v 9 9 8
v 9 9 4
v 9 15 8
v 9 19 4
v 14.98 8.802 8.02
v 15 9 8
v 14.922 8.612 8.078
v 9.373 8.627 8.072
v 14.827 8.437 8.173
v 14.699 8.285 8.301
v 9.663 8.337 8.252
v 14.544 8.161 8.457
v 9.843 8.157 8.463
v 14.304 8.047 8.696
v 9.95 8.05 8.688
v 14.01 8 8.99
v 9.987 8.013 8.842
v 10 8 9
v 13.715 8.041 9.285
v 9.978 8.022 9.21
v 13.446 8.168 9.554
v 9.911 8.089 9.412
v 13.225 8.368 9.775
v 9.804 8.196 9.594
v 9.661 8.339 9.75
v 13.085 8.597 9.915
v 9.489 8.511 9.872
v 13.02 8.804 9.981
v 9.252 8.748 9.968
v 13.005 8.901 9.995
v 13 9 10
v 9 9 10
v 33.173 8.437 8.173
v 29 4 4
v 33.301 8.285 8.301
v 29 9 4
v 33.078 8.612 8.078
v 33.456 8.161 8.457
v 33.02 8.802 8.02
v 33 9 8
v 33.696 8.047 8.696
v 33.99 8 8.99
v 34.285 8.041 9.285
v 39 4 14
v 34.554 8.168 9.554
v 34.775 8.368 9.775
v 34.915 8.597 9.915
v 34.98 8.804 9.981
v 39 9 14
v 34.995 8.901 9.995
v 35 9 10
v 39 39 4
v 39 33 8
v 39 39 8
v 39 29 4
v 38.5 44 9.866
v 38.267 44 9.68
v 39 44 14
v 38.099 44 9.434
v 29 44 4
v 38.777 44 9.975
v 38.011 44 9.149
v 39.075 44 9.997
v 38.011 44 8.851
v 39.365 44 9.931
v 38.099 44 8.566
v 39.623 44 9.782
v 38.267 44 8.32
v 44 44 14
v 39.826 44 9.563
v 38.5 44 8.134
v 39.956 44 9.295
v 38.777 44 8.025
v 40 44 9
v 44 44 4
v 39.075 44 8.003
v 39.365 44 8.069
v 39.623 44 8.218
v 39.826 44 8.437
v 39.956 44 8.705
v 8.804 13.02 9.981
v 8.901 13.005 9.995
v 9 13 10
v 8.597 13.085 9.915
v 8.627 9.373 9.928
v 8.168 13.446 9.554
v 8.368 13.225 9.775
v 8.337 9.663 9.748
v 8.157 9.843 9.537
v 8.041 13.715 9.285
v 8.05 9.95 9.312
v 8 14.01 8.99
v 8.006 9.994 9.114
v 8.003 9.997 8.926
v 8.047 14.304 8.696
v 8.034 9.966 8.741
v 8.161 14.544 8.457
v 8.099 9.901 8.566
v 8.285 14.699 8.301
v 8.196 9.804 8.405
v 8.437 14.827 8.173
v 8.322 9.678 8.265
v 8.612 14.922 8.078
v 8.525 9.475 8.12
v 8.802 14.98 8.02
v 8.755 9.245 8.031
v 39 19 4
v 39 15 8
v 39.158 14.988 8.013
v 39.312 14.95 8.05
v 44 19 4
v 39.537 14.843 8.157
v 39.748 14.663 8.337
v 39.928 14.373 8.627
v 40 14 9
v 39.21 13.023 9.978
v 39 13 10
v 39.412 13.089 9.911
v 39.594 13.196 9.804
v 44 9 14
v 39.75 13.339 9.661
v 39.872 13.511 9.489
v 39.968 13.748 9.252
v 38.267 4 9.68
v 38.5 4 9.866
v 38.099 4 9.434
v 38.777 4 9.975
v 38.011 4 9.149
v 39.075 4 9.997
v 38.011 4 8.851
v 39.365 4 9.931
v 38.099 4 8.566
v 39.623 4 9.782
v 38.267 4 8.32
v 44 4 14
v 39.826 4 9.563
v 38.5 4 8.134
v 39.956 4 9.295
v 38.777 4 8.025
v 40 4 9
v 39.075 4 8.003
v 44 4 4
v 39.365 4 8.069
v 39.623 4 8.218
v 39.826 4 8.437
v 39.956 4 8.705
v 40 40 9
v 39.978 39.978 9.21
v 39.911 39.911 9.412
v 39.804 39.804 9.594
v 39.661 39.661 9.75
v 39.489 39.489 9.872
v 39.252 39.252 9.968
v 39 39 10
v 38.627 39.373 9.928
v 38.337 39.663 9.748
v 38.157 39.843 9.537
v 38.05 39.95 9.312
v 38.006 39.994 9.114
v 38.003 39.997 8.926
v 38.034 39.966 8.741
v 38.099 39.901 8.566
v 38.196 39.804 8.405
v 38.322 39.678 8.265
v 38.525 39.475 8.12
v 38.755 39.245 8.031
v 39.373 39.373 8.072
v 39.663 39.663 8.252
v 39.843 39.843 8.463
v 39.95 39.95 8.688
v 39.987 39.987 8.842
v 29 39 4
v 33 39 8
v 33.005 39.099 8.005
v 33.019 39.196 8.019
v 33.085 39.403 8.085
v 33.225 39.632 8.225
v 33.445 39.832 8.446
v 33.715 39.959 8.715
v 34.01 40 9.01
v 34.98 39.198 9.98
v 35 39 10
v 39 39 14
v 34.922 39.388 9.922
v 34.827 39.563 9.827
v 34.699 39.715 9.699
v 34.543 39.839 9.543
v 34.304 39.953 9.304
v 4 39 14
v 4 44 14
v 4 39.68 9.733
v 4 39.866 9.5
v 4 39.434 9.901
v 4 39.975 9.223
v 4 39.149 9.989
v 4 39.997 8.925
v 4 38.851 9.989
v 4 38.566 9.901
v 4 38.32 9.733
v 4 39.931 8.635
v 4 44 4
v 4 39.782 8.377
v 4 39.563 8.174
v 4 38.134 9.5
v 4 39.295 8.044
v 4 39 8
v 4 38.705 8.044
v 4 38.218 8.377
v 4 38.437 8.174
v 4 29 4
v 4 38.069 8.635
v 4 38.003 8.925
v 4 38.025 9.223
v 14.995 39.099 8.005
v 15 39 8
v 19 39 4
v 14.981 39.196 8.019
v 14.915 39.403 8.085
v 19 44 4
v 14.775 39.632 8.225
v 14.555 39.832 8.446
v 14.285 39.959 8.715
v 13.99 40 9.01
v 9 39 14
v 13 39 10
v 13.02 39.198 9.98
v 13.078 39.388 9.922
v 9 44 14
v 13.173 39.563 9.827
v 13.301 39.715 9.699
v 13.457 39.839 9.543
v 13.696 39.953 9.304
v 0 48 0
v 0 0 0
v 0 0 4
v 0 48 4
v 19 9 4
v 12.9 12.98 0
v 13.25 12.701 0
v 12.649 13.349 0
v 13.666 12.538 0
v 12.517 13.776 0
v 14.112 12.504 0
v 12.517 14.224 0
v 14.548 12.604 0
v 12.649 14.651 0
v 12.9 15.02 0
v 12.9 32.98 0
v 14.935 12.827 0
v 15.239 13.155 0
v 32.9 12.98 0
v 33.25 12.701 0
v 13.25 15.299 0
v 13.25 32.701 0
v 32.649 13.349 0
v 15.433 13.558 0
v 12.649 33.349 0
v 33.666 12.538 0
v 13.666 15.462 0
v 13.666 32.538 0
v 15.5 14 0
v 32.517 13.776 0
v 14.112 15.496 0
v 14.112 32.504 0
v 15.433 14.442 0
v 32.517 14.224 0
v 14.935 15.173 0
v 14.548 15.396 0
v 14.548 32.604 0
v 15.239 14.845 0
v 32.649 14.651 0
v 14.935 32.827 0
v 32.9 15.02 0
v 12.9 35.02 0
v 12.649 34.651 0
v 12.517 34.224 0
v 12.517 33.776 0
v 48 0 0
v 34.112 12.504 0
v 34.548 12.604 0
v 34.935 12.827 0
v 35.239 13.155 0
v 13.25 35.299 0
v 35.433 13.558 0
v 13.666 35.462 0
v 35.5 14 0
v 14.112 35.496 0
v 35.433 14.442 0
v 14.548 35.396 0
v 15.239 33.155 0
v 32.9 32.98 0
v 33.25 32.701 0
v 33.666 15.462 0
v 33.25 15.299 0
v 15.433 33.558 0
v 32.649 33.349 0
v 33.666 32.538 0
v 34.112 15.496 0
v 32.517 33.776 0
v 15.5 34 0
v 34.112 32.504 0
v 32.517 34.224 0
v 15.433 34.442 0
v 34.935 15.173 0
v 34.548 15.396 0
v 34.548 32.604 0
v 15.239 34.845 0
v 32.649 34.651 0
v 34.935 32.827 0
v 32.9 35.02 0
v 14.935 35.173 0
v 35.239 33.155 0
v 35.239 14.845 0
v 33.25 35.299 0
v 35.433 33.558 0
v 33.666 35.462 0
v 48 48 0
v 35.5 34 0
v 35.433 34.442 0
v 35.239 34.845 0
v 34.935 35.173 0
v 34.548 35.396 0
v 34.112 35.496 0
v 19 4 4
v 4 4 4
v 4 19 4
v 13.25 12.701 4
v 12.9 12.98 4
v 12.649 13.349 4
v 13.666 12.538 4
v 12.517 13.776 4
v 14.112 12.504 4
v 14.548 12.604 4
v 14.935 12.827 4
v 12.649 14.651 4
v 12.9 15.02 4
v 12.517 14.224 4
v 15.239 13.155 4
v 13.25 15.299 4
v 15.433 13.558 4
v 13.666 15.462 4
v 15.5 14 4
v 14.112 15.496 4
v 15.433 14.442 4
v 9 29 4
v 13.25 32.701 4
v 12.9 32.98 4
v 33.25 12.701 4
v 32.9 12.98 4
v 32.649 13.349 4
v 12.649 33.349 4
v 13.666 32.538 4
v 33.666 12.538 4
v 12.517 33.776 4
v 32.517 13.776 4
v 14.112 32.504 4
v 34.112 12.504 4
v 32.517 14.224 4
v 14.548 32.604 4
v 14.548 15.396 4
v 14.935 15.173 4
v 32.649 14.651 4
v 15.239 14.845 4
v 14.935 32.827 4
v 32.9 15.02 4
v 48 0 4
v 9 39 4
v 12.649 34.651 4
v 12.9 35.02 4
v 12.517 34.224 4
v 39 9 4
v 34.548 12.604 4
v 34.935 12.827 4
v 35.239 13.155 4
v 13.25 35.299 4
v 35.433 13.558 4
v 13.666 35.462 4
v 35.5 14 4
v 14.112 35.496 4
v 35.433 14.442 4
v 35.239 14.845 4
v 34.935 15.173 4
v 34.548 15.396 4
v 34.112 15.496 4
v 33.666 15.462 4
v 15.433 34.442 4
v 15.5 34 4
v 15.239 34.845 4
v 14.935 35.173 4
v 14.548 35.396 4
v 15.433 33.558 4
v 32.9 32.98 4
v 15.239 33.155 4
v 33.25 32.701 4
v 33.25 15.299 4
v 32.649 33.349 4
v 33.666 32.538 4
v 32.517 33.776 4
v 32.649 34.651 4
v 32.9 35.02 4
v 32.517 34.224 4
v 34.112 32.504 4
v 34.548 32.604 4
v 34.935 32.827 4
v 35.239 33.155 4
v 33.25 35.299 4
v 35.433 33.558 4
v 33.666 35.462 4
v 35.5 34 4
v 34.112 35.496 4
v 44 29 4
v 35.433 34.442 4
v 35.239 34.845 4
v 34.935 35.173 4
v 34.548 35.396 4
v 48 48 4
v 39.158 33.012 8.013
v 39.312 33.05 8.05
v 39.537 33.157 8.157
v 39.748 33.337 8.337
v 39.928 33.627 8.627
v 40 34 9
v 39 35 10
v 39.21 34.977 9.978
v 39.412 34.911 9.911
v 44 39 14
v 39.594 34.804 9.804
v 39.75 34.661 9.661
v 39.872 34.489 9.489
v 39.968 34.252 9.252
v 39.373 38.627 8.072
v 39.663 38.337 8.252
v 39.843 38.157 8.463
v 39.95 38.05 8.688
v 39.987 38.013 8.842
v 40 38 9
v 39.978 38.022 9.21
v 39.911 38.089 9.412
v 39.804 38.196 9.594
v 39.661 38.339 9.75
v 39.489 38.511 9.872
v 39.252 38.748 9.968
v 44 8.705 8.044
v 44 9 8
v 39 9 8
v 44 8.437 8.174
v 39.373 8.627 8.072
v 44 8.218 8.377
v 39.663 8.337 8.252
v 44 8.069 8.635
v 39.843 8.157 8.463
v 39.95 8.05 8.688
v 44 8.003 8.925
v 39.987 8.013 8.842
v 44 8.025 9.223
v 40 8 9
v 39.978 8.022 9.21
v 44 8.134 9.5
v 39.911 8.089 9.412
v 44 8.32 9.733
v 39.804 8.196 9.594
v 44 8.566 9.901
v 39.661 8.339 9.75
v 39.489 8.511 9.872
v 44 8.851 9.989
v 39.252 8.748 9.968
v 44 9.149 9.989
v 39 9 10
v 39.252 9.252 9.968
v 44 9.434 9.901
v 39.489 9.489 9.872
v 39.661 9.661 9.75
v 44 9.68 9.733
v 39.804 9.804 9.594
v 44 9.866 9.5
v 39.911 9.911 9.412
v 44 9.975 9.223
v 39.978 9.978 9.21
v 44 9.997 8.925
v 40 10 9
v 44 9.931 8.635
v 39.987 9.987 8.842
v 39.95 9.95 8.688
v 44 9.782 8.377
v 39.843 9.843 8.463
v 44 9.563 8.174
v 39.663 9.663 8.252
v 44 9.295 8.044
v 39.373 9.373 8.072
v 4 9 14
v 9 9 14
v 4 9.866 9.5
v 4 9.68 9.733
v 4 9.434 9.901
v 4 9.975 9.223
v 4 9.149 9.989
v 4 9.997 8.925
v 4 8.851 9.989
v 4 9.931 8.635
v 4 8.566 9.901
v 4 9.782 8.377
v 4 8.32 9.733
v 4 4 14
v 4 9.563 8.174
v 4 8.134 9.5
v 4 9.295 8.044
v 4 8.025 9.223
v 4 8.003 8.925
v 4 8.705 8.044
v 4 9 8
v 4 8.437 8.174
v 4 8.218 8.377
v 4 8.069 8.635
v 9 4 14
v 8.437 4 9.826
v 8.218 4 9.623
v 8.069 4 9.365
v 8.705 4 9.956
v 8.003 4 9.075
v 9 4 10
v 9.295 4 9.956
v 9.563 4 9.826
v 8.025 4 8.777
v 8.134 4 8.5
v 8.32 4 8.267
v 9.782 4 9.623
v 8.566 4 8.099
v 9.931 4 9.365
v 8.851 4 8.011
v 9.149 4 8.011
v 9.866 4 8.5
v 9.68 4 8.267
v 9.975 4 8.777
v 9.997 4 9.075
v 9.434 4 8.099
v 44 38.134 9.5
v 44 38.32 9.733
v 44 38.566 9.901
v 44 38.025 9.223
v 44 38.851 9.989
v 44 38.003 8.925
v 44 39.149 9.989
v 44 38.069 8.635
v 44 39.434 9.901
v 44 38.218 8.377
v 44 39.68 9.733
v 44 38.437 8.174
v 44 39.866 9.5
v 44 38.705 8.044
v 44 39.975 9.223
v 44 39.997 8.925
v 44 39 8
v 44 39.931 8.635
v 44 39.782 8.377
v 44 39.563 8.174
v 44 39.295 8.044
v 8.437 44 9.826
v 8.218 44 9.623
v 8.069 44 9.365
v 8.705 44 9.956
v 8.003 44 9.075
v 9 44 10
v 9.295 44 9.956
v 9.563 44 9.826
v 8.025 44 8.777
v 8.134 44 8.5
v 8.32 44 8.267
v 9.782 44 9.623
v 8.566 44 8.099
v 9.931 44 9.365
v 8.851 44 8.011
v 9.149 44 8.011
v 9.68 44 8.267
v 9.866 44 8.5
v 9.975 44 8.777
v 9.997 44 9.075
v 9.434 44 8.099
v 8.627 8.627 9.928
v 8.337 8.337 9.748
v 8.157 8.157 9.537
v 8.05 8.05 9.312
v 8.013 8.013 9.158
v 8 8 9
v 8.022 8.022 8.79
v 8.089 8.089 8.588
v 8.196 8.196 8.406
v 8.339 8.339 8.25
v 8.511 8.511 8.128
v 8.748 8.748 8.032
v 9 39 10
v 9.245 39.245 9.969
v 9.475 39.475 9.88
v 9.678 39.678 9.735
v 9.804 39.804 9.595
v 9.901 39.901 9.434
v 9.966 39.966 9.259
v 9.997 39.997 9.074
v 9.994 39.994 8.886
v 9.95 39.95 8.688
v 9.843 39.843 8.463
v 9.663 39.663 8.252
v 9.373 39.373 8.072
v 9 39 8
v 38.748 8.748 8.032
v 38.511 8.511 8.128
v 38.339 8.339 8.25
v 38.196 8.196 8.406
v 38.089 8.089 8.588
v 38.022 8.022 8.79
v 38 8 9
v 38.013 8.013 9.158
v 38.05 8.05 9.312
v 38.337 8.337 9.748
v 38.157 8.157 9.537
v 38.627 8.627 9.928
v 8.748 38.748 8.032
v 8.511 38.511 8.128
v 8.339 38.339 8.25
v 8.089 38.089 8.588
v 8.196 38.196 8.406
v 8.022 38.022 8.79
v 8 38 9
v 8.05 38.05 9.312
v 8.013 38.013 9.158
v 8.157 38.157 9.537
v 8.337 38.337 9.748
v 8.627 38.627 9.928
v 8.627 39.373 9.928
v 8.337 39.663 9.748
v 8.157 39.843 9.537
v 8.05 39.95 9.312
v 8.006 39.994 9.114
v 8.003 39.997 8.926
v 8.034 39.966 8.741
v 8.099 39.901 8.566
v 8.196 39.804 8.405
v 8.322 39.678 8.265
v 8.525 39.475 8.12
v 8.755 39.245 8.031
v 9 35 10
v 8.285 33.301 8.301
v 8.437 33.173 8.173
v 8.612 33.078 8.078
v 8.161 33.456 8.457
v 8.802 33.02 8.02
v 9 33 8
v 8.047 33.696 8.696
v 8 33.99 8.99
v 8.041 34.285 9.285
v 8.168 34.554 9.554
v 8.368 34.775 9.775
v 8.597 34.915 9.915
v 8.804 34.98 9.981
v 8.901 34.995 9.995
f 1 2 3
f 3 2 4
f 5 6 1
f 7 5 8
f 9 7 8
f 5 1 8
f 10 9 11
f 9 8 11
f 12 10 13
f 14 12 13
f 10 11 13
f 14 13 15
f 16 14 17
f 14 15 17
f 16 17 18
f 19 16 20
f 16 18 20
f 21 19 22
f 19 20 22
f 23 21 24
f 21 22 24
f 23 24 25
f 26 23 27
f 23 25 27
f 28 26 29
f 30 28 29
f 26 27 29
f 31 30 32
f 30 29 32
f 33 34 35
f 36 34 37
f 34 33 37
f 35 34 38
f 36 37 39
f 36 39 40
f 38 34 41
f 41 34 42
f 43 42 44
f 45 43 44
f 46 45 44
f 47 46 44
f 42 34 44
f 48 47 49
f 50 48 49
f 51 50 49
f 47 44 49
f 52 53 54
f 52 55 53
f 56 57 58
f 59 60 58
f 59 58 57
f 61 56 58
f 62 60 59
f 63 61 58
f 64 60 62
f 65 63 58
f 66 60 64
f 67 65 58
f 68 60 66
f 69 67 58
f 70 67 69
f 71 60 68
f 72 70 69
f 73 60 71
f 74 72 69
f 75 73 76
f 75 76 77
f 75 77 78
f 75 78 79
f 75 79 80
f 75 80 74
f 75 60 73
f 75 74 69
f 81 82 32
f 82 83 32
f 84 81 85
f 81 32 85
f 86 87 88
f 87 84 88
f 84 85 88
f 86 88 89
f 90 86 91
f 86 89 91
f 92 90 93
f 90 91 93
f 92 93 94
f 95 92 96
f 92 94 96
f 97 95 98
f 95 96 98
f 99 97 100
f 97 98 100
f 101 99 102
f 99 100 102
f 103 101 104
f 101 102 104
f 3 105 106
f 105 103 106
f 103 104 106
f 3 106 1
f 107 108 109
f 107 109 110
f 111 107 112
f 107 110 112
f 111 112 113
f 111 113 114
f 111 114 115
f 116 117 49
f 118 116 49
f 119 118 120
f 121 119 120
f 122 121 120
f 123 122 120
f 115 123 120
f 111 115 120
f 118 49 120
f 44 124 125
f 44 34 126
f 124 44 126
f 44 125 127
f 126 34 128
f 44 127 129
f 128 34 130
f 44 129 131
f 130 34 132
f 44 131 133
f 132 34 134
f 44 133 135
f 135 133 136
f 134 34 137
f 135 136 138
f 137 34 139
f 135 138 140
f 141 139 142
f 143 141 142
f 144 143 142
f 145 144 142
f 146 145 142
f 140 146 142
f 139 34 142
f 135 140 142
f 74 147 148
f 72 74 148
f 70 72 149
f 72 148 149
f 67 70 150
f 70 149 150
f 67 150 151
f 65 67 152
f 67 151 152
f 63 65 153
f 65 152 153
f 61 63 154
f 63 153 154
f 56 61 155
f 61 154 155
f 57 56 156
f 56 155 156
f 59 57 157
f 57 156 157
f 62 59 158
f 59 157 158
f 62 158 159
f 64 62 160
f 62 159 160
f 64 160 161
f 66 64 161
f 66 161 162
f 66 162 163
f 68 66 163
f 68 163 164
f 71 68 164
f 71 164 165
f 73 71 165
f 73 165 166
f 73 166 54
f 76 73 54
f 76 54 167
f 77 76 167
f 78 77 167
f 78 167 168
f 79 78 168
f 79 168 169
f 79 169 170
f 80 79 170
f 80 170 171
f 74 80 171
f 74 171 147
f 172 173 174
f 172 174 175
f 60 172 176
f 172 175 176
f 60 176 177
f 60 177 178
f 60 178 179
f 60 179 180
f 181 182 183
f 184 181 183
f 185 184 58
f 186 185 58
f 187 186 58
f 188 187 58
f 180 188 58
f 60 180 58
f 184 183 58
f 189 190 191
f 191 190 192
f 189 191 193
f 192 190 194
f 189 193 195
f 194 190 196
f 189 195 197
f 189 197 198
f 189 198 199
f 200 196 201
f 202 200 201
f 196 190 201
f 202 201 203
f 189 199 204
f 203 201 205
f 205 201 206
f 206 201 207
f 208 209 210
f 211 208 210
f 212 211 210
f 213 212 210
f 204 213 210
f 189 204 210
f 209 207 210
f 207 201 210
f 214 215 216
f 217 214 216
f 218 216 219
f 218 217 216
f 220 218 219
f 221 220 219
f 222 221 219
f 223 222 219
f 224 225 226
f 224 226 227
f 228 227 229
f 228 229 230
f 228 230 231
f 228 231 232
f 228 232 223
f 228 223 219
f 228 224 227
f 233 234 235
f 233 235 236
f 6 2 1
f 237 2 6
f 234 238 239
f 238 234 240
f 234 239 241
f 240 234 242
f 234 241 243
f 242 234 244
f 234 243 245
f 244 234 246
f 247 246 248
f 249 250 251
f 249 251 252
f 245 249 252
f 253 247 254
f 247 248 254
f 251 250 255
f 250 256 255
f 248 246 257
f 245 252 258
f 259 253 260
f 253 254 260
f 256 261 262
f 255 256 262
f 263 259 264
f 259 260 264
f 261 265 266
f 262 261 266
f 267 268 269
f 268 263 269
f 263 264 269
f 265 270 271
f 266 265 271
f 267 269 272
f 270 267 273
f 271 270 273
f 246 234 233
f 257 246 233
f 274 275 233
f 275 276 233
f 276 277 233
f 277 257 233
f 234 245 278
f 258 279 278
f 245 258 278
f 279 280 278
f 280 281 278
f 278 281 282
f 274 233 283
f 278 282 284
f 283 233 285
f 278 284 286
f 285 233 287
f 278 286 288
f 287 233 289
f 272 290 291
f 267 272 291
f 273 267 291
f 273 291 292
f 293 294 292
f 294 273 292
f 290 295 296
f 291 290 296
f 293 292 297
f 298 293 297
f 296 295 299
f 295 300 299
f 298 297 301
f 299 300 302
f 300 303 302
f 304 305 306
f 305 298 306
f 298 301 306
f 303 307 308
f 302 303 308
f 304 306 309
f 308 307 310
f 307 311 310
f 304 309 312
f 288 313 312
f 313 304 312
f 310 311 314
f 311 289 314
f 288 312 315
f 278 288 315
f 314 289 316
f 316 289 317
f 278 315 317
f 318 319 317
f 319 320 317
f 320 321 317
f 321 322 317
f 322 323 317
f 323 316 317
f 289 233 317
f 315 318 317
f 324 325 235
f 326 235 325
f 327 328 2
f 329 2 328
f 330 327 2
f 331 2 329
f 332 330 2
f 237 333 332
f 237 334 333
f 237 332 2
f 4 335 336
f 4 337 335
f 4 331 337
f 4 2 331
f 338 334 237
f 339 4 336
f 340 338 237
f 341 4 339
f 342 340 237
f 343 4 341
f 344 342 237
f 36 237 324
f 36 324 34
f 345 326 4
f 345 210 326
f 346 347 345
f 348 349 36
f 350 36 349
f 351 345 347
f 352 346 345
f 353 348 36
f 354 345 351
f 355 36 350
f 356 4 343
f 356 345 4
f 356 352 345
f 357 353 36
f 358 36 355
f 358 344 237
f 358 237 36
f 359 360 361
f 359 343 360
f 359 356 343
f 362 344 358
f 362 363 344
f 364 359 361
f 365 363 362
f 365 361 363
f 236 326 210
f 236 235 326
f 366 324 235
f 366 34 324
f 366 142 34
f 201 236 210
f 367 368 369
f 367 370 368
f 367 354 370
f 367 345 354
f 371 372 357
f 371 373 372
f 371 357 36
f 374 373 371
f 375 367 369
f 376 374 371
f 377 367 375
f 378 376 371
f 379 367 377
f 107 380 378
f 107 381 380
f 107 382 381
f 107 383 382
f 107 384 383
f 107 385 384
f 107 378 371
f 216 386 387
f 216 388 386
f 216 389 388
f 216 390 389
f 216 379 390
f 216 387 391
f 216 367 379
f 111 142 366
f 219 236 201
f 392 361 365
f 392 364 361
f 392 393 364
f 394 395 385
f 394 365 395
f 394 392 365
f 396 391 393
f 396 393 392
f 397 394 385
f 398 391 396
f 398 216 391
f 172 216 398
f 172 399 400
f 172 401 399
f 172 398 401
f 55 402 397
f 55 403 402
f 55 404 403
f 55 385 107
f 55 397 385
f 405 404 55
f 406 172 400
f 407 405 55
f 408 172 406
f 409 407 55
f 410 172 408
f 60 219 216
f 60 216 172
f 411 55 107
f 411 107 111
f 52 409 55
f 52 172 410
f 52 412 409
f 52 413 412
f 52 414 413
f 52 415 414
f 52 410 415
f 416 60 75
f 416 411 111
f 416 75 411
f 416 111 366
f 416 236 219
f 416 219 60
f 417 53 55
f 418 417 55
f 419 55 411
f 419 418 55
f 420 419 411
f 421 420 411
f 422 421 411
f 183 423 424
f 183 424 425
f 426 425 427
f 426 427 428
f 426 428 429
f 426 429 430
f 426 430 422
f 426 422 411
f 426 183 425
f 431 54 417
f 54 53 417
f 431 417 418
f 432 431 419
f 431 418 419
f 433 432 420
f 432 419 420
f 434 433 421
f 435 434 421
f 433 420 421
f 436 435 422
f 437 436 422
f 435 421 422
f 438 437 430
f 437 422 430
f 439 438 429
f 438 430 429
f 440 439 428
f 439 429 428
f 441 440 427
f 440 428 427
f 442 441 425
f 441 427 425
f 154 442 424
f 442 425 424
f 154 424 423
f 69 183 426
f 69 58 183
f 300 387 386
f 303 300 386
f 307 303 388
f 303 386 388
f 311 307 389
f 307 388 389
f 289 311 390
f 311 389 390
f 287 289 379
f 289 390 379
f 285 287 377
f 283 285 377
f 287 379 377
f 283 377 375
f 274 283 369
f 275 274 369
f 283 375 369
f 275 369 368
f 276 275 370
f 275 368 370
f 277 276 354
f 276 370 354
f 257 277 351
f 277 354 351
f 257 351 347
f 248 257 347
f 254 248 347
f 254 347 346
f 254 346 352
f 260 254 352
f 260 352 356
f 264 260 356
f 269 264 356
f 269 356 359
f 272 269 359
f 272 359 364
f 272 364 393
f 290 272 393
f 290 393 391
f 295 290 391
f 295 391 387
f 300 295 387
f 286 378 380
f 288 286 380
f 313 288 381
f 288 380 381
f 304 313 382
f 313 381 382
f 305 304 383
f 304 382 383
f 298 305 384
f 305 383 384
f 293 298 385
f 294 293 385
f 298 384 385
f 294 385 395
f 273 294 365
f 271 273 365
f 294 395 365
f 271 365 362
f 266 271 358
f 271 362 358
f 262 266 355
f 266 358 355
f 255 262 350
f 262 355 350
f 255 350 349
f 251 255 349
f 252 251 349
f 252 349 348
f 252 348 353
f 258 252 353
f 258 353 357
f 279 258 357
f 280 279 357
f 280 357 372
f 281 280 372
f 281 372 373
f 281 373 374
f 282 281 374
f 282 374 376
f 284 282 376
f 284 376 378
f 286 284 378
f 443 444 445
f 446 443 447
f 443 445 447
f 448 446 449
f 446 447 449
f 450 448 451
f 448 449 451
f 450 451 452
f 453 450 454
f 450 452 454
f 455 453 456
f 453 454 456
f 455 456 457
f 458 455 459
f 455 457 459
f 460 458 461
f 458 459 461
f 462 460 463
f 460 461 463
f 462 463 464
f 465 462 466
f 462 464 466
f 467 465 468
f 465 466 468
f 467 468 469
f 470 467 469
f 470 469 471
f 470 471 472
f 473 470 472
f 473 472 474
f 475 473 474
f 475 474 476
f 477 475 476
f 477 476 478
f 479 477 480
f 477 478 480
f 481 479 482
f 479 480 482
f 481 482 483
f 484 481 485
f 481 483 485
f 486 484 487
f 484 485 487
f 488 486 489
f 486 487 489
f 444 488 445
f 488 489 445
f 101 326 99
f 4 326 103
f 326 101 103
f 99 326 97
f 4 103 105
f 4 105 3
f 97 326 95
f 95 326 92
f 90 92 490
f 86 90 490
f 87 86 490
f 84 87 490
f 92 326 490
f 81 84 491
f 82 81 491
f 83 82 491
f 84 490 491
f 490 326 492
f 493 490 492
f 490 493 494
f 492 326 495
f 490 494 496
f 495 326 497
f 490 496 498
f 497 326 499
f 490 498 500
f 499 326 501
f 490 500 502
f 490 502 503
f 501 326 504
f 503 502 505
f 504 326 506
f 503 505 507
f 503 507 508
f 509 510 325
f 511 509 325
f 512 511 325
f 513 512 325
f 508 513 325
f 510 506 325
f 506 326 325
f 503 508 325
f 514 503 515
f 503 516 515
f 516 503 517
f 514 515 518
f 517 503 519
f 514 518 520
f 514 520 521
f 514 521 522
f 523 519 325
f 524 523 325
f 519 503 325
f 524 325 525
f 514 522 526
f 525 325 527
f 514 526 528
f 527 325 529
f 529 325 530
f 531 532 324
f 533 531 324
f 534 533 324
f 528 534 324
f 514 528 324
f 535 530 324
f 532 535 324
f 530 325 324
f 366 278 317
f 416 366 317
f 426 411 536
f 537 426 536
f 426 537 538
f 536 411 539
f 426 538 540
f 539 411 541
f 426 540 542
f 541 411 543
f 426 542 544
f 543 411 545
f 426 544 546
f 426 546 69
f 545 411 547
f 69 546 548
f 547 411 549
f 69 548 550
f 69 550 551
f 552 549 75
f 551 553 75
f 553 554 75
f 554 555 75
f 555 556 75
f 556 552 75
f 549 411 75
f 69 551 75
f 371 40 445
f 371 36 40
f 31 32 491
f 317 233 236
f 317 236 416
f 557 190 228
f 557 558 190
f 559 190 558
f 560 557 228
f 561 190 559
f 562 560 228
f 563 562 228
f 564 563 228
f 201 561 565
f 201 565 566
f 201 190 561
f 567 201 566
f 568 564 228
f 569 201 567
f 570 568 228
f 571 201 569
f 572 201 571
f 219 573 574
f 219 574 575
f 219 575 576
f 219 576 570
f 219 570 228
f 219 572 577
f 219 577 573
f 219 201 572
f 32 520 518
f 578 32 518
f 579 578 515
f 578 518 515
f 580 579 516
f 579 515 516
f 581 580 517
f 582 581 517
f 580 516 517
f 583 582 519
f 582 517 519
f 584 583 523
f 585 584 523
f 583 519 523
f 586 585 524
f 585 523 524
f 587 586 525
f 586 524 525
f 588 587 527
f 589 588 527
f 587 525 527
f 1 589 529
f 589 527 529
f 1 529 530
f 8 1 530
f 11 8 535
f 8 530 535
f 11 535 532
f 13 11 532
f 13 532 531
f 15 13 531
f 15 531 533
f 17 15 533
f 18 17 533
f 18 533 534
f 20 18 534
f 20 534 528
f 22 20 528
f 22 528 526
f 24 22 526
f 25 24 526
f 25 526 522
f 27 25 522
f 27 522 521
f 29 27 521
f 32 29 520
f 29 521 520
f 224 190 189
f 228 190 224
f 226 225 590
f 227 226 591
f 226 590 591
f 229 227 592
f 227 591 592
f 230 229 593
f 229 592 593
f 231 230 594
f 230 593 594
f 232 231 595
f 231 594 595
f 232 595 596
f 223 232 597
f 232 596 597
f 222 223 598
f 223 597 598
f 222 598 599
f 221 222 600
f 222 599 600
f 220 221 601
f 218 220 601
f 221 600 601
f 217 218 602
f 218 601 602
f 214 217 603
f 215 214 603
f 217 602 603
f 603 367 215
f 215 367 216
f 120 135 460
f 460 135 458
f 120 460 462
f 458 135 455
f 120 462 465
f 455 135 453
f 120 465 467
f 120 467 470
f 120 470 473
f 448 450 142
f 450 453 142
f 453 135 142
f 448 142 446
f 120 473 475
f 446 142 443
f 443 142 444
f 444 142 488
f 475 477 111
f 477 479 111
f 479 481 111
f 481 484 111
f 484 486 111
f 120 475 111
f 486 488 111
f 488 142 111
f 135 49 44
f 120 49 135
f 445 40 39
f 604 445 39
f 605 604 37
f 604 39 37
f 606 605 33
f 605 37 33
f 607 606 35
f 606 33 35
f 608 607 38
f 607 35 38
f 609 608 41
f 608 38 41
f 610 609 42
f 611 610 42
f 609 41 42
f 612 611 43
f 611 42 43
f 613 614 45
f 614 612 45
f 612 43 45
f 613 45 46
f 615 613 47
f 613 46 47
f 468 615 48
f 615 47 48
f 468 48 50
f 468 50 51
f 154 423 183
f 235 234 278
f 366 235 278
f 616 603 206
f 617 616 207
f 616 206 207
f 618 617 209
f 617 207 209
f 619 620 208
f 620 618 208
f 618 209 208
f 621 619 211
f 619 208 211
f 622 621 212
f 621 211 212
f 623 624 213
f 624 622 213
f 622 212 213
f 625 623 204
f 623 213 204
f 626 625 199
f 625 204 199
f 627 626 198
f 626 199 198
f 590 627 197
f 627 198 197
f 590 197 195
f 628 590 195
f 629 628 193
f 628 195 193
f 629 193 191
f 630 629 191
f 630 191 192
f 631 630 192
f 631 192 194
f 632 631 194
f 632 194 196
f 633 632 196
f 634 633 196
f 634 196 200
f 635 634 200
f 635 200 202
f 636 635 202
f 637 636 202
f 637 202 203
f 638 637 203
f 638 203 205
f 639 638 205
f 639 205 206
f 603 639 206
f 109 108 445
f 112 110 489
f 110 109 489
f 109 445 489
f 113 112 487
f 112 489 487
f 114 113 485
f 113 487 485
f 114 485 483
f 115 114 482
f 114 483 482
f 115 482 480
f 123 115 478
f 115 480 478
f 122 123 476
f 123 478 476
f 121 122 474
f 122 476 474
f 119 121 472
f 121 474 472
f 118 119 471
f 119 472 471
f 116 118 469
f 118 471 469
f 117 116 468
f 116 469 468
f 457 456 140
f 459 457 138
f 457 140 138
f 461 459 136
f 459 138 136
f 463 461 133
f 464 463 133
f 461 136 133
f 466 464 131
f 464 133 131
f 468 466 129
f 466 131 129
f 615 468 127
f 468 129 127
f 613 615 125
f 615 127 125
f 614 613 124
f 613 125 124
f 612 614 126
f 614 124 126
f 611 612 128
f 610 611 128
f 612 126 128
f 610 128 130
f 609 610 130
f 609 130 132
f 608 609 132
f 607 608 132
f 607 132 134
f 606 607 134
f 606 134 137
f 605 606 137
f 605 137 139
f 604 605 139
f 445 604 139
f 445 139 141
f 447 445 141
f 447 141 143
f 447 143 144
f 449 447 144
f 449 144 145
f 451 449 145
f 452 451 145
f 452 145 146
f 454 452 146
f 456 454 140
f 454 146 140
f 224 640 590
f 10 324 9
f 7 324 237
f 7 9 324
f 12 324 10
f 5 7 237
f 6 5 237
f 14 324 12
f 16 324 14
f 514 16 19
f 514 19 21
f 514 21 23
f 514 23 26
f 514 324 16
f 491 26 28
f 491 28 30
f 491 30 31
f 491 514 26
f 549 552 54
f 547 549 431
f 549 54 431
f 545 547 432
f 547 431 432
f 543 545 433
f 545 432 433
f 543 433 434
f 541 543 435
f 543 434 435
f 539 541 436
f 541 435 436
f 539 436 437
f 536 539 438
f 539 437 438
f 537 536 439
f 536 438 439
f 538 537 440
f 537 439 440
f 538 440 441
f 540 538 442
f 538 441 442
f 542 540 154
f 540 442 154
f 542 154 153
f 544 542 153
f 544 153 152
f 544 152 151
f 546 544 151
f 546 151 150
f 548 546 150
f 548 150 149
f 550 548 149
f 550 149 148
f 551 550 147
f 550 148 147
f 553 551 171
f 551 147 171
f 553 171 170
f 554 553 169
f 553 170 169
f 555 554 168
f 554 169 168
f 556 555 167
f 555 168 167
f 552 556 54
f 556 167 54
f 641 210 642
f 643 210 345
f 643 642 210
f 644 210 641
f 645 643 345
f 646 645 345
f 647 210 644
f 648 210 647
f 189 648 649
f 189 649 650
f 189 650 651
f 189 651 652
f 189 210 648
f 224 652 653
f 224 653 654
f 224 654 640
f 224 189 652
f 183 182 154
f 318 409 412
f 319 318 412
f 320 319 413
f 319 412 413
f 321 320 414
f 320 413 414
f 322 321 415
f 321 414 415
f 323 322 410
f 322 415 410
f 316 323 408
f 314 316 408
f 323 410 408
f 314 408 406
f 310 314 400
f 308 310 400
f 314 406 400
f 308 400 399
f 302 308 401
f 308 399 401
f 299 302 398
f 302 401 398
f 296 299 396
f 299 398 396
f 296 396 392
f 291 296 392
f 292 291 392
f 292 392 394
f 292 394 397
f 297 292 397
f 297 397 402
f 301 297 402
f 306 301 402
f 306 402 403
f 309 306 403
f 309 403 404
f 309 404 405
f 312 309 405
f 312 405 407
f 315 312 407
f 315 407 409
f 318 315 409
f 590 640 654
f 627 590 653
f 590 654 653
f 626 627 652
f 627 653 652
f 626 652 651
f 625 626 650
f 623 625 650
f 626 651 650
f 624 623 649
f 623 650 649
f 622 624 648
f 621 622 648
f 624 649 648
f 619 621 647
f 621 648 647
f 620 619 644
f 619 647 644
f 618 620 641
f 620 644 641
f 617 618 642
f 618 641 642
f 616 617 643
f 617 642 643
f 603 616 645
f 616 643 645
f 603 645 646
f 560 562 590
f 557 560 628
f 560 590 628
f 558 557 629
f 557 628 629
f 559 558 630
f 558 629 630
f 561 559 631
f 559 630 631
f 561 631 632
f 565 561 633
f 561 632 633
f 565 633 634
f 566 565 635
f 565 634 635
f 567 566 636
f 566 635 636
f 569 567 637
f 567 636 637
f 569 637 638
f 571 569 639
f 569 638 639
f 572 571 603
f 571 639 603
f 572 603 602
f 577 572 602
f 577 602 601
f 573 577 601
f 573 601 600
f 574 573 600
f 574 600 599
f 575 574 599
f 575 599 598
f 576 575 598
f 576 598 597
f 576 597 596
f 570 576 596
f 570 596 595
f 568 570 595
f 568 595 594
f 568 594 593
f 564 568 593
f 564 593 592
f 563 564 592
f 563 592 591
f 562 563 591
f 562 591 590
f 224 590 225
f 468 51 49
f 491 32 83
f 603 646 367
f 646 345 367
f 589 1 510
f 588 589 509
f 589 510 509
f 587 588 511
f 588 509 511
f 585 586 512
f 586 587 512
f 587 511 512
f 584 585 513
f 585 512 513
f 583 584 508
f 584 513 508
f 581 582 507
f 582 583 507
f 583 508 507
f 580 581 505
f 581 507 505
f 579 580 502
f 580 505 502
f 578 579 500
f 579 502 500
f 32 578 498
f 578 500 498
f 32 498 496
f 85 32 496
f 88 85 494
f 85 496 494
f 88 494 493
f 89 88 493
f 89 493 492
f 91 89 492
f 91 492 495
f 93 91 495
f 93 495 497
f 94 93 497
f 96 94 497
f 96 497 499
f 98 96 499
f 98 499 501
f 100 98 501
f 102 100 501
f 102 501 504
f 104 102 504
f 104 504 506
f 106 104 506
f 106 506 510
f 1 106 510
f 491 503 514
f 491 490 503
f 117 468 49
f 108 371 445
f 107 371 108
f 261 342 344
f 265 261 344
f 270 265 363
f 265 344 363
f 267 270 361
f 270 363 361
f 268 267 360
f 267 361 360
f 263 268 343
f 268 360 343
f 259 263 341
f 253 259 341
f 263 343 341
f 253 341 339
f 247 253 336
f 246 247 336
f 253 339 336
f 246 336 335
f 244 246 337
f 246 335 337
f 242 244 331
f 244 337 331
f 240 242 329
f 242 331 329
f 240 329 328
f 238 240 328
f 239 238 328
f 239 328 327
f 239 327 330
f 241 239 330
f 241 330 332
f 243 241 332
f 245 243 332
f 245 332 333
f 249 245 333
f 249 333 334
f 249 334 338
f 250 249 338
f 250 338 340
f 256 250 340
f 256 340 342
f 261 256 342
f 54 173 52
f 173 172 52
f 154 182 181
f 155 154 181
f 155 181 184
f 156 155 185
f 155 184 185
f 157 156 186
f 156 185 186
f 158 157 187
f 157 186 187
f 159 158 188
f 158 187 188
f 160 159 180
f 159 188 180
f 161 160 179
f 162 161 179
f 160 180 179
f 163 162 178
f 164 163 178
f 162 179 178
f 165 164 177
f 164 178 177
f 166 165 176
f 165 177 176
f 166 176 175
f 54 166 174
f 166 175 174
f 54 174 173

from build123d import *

# Parameters (mm, degrees)
SKIZZE1_W                       = 48
SKIZZE1_H                       = 48
AUFSATZ_LINEAR_AUSTRAGEN1_DEPTH = 4
SKIZZE2_W                       = 5
SKIZZE2_H                       = 10
SKIZZE2_W_2                     = 15
SKIZZE2_H_2                     = 5
AUFSATZ_LINEAR_AUSTRAGEN3_DEPTH = 10
FASE1_SIZE                      = 10
SCHNITT_LINEAR_AUSTRAGEN1_REACH = 68.603
SKIZZE3_R                       = 1
SCHNITT_LINEAR_AUSTRAGEN2_REACH = 68.603
SKIZZE4_R                       = 1
SCHNITT_LINEAR_AUSTRAGEN3_REACH = 70.615
SKIZZE5_R                       = 1.5


with BuildPart() as part:
    # Skizze1 → Aufsatz-Linear austragen1 (new body)
    with BuildSketch(Plane.XY):
        with Locations((24, 24)):
            Rectangle(SKIZZE1_W, SKIZZE1_H)
    extrude(amount=AUFSATZ_LINEAR_AUSTRAGEN1_DEPTH)

    # Skizze2 → Aufsatz-Linear austragen3 (add)
    with BuildSketch(Plane.XY.offset(4)):
        with Locations((6.5, 34)):
            Rectangle(SKIZZE2_W, SKIZZE2_H)
        with Locations((11.5, 41.5)):
            Rectangle(SKIZZE2_W_2, SKIZZE2_H_2)
        with Locations((36.5, 41.5)):
            Rectangle(SKIZZE2_W_2, SKIZZE2_H_2)
        with Locations((41.5, 34)):
            Rectangle(SKIZZE2_W, SKIZZE2_H)
        with Locations((41.5, 14)):
            Rectangle(SKIZZE2_W, SKIZZE2_H)
        with Locations((36.5, 6.5)):
            Rectangle(SKIZZE2_W_2, SKIZZE2_H_2)
        with Locations((11.5, 6.5)):
            Rectangle(SKIZZE2_W_2, SKIZZE2_H_2)
        with Locations((6.5, 14)):
            Rectangle(SKIZZE2_W, SKIZZE2_H)
    extrude(amount=AUFSATZ_LINEAR_AUSTRAGEN3_DEPTH)

    # Fase1
    fase1_edges = [part.edges().sort_by_distance(p)[0] for p in [
        (19, 41.5, 14),
        (29, 41.5, 14),
        (41.5, 29, 14),
        (41.5, 19, 14),
        (29, 6.5, 14),
        (6.5, 19, 14),
        (6.5, 29, 14),
        (19, 6.5, 14),
    ]]
    chamfer(fase1_edges, length=FASE1_SIZE - 0.0001)  # a hair under: the kernel refuses the full size

    # Schnitt-Linear austragen1: up to this face of the body (flat: up to its plane)
    schnitt_linear_austragen1_end = Plane(part.part.faces().sort_by_distance((9.4167125, 44, 8.166675))[0])
    # Skizze3 → Schnitt-Linear austragen1 (cut, up to the picked face)
    with BuildSketch(Plane.XZ.offset(-4), mode=Mode.PRIVATE) as schnitt_linear_austragen1_sk1:
        with Locations(Location((9, 9, 0), (0, 0, 90))):
            Circle(SKIZZE3_R)
    schnitt_linear_austragen1_tool1 = split(extrude(schnitt_linear_austragen1_sk1.sketch, amount=-SCHNITT_LINEAR_AUSTRAGEN1_REACH, mode=Mode.PRIVATE), bisect_by=schnitt_linear_austragen1_end, keep=Keep.BOTH, mode=Mode.PRIVATE)
    # Skizze3 → Schnitt-Linear austragen1 (cut, up to the picked face)
    with BuildSketch(Plane.XZ.offset(-4), mode=Mode.PRIVATE) as schnitt_linear_austragen1_sk2:
        with Locations((39, 9)):
            Circle(SKIZZE3_R)
    schnitt_linear_austragen1_tool2 = split(extrude(schnitt_linear_austragen1_sk2.sketch, amount=-SCHNITT_LINEAR_AUSTRAGEN1_REACH, mode=Mode.PRIVATE), bisect_by=schnitt_linear_austragen1_end, keep=Keep.BOTH, mode=Mode.PRIVATE)
    add(schnitt_linear_austragen1_tool1.solids().sort_by(Axis((9, 4, 9), (0, 1, 0)))[0], mode=Mode.SUBTRACT)
    add(schnitt_linear_austragen1_tool2.solids().sort_by(Axis((39, 4, 9), (0, 1, 0)))[0], mode=Mode.SUBTRACT)

    # Schnitt-Linear austragen2: up to this face of the body (flat: up to its plane)
    schnitt_linear_austragen2_end = Plane(part.part.faces().sort_by_distance((44, 9.4167125, 8.166675))[0])
    # Skizze4 → Schnitt-Linear austragen2 (cut, up to the picked face)
    with BuildSketch(Plane.ZY.offset(-4), mode=Mode.PRIVATE) as schnitt_linear_austragen2_sk1:
        with Locations(Location((9, 39, 0), (0, 0, 180))):
            Circle(SKIZZE4_R)
    schnitt_linear_austragen2_tool1 = split(extrude(schnitt_linear_austragen2_sk1.sketch, amount=-SCHNITT_LINEAR_AUSTRAGEN2_REACH, mode=Mode.PRIVATE), bisect_by=schnitt_linear_austragen2_end, keep=Keep.BOTH, mode=Mode.PRIVATE)
    # Skizze4 → Schnitt-Linear austragen2 (cut, up to the picked face)
    with BuildSketch(Plane.ZY.offset(-4), mode=Mode.PRIVATE) as schnitt_linear_austragen2_sk2:
        with Locations(Location((9, 9, 0), (0, 0, 180))):
            Circle(SKIZZE4_R)
    schnitt_linear_austragen2_tool2 = split(extrude(schnitt_linear_austragen2_sk2.sketch, amount=-SCHNITT_LINEAR_AUSTRAGEN2_REACH, mode=Mode.PRIVATE), bisect_by=schnitt_linear_austragen2_end, keep=Keep.BOTH, mode=Mode.PRIVATE)
    add(schnitt_linear_austragen2_tool1.solids().sort_by(Axis((4, 39, 9), (1, 0, 0)))[0], mode=Mode.SUBTRACT)
    add(schnitt_linear_austragen2_tool2.solids().sort_by(Axis((4, 9, 9), (1, 0, 0)))[0], mode=Mode.SUBTRACT)

    # Skizze5 → Schnitt-Linear austragen3 (cut, up to next)
    with BuildSketch(Plane.XY.offset(4), mode=Mode.PRIVATE) as schnitt_linear_austragen3_sk1:
        with Locations((34, 14)):
            Circle(SKIZZE5_R)
    schnitt_linear_austragen3_tool1 = extrude(schnitt_linear_austragen3_sk1.sketch, amount=-SCHNITT_LINEAR_AUSTRAGEN3_REACH, mode=Mode.PRIVATE) & part.part
    # Skizze5 → Schnitt-Linear austragen3 (cut, up to next)
    with BuildSketch(Plane.XY.offset(4), mode=Mode.PRIVATE) as schnitt_linear_austragen3_sk2:
        with Locations((14, 14)):
            Circle(SKIZZE5_R)
    schnitt_linear_austragen3_tool2 = extrude(schnitt_linear_austragen3_sk2.sketch, amount=-SCHNITT_LINEAR_AUSTRAGEN3_REACH, mode=Mode.PRIVATE) & part.part
    # Skizze5 → Schnitt-Linear austragen3 (cut, up to next)
    with BuildSketch(Plane.XY.offset(4), mode=Mode.PRIVATE) as schnitt_linear_austragen3_sk3:
        with Locations((14, 34)):
            Circle(SKIZZE5_R)
    schnitt_linear_austragen3_tool3 = extrude(schnitt_linear_austragen3_sk3.sketch, amount=-SCHNITT_LINEAR_AUSTRAGEN3_REACH, mode=Mode.PRIVATE) & part.part
    # Skizze5 → Schnitt-Linear austragen3 (cut, up to next)
    with BuildSketch(Plane.XY.offset(4), mode=Mode.PRIVATE) as schnitt_linear_austragen3_sk4:
        with Locations((34, 34)):
            Circle(SKIZZE5_R)
    schnitt_linear_austragen3_tool4 = extrude(schnitt_linear_austragen3_sk4.sketch, amount=-SCHNITT_LINEAR_AUSTRAGEN3_REACH, mode=Mode.PRIVATE) & part.part
    add(schnitt_linear_austragen3_tool1.solids().sort_by_distance((34, 14, 4))[0], mode=Mode.SUBTRACT)
    add(schnitt_linear_austragen3_tool2.solids().sort_by_distance((14, 14, 4))[0], mode=Mode.SUBTRACT)
    add(schnitt_linear_austragen3_tool3.solids().sort_by_distance((14, 34, 4))[0], mode=Mode.SUBTRACT)
    add(schnitt_linear_austragen3_tool4.solids().sort_by_distance((34, 34, 4))[0], mode=Mode.SUBTRACT)


solid = part.part
